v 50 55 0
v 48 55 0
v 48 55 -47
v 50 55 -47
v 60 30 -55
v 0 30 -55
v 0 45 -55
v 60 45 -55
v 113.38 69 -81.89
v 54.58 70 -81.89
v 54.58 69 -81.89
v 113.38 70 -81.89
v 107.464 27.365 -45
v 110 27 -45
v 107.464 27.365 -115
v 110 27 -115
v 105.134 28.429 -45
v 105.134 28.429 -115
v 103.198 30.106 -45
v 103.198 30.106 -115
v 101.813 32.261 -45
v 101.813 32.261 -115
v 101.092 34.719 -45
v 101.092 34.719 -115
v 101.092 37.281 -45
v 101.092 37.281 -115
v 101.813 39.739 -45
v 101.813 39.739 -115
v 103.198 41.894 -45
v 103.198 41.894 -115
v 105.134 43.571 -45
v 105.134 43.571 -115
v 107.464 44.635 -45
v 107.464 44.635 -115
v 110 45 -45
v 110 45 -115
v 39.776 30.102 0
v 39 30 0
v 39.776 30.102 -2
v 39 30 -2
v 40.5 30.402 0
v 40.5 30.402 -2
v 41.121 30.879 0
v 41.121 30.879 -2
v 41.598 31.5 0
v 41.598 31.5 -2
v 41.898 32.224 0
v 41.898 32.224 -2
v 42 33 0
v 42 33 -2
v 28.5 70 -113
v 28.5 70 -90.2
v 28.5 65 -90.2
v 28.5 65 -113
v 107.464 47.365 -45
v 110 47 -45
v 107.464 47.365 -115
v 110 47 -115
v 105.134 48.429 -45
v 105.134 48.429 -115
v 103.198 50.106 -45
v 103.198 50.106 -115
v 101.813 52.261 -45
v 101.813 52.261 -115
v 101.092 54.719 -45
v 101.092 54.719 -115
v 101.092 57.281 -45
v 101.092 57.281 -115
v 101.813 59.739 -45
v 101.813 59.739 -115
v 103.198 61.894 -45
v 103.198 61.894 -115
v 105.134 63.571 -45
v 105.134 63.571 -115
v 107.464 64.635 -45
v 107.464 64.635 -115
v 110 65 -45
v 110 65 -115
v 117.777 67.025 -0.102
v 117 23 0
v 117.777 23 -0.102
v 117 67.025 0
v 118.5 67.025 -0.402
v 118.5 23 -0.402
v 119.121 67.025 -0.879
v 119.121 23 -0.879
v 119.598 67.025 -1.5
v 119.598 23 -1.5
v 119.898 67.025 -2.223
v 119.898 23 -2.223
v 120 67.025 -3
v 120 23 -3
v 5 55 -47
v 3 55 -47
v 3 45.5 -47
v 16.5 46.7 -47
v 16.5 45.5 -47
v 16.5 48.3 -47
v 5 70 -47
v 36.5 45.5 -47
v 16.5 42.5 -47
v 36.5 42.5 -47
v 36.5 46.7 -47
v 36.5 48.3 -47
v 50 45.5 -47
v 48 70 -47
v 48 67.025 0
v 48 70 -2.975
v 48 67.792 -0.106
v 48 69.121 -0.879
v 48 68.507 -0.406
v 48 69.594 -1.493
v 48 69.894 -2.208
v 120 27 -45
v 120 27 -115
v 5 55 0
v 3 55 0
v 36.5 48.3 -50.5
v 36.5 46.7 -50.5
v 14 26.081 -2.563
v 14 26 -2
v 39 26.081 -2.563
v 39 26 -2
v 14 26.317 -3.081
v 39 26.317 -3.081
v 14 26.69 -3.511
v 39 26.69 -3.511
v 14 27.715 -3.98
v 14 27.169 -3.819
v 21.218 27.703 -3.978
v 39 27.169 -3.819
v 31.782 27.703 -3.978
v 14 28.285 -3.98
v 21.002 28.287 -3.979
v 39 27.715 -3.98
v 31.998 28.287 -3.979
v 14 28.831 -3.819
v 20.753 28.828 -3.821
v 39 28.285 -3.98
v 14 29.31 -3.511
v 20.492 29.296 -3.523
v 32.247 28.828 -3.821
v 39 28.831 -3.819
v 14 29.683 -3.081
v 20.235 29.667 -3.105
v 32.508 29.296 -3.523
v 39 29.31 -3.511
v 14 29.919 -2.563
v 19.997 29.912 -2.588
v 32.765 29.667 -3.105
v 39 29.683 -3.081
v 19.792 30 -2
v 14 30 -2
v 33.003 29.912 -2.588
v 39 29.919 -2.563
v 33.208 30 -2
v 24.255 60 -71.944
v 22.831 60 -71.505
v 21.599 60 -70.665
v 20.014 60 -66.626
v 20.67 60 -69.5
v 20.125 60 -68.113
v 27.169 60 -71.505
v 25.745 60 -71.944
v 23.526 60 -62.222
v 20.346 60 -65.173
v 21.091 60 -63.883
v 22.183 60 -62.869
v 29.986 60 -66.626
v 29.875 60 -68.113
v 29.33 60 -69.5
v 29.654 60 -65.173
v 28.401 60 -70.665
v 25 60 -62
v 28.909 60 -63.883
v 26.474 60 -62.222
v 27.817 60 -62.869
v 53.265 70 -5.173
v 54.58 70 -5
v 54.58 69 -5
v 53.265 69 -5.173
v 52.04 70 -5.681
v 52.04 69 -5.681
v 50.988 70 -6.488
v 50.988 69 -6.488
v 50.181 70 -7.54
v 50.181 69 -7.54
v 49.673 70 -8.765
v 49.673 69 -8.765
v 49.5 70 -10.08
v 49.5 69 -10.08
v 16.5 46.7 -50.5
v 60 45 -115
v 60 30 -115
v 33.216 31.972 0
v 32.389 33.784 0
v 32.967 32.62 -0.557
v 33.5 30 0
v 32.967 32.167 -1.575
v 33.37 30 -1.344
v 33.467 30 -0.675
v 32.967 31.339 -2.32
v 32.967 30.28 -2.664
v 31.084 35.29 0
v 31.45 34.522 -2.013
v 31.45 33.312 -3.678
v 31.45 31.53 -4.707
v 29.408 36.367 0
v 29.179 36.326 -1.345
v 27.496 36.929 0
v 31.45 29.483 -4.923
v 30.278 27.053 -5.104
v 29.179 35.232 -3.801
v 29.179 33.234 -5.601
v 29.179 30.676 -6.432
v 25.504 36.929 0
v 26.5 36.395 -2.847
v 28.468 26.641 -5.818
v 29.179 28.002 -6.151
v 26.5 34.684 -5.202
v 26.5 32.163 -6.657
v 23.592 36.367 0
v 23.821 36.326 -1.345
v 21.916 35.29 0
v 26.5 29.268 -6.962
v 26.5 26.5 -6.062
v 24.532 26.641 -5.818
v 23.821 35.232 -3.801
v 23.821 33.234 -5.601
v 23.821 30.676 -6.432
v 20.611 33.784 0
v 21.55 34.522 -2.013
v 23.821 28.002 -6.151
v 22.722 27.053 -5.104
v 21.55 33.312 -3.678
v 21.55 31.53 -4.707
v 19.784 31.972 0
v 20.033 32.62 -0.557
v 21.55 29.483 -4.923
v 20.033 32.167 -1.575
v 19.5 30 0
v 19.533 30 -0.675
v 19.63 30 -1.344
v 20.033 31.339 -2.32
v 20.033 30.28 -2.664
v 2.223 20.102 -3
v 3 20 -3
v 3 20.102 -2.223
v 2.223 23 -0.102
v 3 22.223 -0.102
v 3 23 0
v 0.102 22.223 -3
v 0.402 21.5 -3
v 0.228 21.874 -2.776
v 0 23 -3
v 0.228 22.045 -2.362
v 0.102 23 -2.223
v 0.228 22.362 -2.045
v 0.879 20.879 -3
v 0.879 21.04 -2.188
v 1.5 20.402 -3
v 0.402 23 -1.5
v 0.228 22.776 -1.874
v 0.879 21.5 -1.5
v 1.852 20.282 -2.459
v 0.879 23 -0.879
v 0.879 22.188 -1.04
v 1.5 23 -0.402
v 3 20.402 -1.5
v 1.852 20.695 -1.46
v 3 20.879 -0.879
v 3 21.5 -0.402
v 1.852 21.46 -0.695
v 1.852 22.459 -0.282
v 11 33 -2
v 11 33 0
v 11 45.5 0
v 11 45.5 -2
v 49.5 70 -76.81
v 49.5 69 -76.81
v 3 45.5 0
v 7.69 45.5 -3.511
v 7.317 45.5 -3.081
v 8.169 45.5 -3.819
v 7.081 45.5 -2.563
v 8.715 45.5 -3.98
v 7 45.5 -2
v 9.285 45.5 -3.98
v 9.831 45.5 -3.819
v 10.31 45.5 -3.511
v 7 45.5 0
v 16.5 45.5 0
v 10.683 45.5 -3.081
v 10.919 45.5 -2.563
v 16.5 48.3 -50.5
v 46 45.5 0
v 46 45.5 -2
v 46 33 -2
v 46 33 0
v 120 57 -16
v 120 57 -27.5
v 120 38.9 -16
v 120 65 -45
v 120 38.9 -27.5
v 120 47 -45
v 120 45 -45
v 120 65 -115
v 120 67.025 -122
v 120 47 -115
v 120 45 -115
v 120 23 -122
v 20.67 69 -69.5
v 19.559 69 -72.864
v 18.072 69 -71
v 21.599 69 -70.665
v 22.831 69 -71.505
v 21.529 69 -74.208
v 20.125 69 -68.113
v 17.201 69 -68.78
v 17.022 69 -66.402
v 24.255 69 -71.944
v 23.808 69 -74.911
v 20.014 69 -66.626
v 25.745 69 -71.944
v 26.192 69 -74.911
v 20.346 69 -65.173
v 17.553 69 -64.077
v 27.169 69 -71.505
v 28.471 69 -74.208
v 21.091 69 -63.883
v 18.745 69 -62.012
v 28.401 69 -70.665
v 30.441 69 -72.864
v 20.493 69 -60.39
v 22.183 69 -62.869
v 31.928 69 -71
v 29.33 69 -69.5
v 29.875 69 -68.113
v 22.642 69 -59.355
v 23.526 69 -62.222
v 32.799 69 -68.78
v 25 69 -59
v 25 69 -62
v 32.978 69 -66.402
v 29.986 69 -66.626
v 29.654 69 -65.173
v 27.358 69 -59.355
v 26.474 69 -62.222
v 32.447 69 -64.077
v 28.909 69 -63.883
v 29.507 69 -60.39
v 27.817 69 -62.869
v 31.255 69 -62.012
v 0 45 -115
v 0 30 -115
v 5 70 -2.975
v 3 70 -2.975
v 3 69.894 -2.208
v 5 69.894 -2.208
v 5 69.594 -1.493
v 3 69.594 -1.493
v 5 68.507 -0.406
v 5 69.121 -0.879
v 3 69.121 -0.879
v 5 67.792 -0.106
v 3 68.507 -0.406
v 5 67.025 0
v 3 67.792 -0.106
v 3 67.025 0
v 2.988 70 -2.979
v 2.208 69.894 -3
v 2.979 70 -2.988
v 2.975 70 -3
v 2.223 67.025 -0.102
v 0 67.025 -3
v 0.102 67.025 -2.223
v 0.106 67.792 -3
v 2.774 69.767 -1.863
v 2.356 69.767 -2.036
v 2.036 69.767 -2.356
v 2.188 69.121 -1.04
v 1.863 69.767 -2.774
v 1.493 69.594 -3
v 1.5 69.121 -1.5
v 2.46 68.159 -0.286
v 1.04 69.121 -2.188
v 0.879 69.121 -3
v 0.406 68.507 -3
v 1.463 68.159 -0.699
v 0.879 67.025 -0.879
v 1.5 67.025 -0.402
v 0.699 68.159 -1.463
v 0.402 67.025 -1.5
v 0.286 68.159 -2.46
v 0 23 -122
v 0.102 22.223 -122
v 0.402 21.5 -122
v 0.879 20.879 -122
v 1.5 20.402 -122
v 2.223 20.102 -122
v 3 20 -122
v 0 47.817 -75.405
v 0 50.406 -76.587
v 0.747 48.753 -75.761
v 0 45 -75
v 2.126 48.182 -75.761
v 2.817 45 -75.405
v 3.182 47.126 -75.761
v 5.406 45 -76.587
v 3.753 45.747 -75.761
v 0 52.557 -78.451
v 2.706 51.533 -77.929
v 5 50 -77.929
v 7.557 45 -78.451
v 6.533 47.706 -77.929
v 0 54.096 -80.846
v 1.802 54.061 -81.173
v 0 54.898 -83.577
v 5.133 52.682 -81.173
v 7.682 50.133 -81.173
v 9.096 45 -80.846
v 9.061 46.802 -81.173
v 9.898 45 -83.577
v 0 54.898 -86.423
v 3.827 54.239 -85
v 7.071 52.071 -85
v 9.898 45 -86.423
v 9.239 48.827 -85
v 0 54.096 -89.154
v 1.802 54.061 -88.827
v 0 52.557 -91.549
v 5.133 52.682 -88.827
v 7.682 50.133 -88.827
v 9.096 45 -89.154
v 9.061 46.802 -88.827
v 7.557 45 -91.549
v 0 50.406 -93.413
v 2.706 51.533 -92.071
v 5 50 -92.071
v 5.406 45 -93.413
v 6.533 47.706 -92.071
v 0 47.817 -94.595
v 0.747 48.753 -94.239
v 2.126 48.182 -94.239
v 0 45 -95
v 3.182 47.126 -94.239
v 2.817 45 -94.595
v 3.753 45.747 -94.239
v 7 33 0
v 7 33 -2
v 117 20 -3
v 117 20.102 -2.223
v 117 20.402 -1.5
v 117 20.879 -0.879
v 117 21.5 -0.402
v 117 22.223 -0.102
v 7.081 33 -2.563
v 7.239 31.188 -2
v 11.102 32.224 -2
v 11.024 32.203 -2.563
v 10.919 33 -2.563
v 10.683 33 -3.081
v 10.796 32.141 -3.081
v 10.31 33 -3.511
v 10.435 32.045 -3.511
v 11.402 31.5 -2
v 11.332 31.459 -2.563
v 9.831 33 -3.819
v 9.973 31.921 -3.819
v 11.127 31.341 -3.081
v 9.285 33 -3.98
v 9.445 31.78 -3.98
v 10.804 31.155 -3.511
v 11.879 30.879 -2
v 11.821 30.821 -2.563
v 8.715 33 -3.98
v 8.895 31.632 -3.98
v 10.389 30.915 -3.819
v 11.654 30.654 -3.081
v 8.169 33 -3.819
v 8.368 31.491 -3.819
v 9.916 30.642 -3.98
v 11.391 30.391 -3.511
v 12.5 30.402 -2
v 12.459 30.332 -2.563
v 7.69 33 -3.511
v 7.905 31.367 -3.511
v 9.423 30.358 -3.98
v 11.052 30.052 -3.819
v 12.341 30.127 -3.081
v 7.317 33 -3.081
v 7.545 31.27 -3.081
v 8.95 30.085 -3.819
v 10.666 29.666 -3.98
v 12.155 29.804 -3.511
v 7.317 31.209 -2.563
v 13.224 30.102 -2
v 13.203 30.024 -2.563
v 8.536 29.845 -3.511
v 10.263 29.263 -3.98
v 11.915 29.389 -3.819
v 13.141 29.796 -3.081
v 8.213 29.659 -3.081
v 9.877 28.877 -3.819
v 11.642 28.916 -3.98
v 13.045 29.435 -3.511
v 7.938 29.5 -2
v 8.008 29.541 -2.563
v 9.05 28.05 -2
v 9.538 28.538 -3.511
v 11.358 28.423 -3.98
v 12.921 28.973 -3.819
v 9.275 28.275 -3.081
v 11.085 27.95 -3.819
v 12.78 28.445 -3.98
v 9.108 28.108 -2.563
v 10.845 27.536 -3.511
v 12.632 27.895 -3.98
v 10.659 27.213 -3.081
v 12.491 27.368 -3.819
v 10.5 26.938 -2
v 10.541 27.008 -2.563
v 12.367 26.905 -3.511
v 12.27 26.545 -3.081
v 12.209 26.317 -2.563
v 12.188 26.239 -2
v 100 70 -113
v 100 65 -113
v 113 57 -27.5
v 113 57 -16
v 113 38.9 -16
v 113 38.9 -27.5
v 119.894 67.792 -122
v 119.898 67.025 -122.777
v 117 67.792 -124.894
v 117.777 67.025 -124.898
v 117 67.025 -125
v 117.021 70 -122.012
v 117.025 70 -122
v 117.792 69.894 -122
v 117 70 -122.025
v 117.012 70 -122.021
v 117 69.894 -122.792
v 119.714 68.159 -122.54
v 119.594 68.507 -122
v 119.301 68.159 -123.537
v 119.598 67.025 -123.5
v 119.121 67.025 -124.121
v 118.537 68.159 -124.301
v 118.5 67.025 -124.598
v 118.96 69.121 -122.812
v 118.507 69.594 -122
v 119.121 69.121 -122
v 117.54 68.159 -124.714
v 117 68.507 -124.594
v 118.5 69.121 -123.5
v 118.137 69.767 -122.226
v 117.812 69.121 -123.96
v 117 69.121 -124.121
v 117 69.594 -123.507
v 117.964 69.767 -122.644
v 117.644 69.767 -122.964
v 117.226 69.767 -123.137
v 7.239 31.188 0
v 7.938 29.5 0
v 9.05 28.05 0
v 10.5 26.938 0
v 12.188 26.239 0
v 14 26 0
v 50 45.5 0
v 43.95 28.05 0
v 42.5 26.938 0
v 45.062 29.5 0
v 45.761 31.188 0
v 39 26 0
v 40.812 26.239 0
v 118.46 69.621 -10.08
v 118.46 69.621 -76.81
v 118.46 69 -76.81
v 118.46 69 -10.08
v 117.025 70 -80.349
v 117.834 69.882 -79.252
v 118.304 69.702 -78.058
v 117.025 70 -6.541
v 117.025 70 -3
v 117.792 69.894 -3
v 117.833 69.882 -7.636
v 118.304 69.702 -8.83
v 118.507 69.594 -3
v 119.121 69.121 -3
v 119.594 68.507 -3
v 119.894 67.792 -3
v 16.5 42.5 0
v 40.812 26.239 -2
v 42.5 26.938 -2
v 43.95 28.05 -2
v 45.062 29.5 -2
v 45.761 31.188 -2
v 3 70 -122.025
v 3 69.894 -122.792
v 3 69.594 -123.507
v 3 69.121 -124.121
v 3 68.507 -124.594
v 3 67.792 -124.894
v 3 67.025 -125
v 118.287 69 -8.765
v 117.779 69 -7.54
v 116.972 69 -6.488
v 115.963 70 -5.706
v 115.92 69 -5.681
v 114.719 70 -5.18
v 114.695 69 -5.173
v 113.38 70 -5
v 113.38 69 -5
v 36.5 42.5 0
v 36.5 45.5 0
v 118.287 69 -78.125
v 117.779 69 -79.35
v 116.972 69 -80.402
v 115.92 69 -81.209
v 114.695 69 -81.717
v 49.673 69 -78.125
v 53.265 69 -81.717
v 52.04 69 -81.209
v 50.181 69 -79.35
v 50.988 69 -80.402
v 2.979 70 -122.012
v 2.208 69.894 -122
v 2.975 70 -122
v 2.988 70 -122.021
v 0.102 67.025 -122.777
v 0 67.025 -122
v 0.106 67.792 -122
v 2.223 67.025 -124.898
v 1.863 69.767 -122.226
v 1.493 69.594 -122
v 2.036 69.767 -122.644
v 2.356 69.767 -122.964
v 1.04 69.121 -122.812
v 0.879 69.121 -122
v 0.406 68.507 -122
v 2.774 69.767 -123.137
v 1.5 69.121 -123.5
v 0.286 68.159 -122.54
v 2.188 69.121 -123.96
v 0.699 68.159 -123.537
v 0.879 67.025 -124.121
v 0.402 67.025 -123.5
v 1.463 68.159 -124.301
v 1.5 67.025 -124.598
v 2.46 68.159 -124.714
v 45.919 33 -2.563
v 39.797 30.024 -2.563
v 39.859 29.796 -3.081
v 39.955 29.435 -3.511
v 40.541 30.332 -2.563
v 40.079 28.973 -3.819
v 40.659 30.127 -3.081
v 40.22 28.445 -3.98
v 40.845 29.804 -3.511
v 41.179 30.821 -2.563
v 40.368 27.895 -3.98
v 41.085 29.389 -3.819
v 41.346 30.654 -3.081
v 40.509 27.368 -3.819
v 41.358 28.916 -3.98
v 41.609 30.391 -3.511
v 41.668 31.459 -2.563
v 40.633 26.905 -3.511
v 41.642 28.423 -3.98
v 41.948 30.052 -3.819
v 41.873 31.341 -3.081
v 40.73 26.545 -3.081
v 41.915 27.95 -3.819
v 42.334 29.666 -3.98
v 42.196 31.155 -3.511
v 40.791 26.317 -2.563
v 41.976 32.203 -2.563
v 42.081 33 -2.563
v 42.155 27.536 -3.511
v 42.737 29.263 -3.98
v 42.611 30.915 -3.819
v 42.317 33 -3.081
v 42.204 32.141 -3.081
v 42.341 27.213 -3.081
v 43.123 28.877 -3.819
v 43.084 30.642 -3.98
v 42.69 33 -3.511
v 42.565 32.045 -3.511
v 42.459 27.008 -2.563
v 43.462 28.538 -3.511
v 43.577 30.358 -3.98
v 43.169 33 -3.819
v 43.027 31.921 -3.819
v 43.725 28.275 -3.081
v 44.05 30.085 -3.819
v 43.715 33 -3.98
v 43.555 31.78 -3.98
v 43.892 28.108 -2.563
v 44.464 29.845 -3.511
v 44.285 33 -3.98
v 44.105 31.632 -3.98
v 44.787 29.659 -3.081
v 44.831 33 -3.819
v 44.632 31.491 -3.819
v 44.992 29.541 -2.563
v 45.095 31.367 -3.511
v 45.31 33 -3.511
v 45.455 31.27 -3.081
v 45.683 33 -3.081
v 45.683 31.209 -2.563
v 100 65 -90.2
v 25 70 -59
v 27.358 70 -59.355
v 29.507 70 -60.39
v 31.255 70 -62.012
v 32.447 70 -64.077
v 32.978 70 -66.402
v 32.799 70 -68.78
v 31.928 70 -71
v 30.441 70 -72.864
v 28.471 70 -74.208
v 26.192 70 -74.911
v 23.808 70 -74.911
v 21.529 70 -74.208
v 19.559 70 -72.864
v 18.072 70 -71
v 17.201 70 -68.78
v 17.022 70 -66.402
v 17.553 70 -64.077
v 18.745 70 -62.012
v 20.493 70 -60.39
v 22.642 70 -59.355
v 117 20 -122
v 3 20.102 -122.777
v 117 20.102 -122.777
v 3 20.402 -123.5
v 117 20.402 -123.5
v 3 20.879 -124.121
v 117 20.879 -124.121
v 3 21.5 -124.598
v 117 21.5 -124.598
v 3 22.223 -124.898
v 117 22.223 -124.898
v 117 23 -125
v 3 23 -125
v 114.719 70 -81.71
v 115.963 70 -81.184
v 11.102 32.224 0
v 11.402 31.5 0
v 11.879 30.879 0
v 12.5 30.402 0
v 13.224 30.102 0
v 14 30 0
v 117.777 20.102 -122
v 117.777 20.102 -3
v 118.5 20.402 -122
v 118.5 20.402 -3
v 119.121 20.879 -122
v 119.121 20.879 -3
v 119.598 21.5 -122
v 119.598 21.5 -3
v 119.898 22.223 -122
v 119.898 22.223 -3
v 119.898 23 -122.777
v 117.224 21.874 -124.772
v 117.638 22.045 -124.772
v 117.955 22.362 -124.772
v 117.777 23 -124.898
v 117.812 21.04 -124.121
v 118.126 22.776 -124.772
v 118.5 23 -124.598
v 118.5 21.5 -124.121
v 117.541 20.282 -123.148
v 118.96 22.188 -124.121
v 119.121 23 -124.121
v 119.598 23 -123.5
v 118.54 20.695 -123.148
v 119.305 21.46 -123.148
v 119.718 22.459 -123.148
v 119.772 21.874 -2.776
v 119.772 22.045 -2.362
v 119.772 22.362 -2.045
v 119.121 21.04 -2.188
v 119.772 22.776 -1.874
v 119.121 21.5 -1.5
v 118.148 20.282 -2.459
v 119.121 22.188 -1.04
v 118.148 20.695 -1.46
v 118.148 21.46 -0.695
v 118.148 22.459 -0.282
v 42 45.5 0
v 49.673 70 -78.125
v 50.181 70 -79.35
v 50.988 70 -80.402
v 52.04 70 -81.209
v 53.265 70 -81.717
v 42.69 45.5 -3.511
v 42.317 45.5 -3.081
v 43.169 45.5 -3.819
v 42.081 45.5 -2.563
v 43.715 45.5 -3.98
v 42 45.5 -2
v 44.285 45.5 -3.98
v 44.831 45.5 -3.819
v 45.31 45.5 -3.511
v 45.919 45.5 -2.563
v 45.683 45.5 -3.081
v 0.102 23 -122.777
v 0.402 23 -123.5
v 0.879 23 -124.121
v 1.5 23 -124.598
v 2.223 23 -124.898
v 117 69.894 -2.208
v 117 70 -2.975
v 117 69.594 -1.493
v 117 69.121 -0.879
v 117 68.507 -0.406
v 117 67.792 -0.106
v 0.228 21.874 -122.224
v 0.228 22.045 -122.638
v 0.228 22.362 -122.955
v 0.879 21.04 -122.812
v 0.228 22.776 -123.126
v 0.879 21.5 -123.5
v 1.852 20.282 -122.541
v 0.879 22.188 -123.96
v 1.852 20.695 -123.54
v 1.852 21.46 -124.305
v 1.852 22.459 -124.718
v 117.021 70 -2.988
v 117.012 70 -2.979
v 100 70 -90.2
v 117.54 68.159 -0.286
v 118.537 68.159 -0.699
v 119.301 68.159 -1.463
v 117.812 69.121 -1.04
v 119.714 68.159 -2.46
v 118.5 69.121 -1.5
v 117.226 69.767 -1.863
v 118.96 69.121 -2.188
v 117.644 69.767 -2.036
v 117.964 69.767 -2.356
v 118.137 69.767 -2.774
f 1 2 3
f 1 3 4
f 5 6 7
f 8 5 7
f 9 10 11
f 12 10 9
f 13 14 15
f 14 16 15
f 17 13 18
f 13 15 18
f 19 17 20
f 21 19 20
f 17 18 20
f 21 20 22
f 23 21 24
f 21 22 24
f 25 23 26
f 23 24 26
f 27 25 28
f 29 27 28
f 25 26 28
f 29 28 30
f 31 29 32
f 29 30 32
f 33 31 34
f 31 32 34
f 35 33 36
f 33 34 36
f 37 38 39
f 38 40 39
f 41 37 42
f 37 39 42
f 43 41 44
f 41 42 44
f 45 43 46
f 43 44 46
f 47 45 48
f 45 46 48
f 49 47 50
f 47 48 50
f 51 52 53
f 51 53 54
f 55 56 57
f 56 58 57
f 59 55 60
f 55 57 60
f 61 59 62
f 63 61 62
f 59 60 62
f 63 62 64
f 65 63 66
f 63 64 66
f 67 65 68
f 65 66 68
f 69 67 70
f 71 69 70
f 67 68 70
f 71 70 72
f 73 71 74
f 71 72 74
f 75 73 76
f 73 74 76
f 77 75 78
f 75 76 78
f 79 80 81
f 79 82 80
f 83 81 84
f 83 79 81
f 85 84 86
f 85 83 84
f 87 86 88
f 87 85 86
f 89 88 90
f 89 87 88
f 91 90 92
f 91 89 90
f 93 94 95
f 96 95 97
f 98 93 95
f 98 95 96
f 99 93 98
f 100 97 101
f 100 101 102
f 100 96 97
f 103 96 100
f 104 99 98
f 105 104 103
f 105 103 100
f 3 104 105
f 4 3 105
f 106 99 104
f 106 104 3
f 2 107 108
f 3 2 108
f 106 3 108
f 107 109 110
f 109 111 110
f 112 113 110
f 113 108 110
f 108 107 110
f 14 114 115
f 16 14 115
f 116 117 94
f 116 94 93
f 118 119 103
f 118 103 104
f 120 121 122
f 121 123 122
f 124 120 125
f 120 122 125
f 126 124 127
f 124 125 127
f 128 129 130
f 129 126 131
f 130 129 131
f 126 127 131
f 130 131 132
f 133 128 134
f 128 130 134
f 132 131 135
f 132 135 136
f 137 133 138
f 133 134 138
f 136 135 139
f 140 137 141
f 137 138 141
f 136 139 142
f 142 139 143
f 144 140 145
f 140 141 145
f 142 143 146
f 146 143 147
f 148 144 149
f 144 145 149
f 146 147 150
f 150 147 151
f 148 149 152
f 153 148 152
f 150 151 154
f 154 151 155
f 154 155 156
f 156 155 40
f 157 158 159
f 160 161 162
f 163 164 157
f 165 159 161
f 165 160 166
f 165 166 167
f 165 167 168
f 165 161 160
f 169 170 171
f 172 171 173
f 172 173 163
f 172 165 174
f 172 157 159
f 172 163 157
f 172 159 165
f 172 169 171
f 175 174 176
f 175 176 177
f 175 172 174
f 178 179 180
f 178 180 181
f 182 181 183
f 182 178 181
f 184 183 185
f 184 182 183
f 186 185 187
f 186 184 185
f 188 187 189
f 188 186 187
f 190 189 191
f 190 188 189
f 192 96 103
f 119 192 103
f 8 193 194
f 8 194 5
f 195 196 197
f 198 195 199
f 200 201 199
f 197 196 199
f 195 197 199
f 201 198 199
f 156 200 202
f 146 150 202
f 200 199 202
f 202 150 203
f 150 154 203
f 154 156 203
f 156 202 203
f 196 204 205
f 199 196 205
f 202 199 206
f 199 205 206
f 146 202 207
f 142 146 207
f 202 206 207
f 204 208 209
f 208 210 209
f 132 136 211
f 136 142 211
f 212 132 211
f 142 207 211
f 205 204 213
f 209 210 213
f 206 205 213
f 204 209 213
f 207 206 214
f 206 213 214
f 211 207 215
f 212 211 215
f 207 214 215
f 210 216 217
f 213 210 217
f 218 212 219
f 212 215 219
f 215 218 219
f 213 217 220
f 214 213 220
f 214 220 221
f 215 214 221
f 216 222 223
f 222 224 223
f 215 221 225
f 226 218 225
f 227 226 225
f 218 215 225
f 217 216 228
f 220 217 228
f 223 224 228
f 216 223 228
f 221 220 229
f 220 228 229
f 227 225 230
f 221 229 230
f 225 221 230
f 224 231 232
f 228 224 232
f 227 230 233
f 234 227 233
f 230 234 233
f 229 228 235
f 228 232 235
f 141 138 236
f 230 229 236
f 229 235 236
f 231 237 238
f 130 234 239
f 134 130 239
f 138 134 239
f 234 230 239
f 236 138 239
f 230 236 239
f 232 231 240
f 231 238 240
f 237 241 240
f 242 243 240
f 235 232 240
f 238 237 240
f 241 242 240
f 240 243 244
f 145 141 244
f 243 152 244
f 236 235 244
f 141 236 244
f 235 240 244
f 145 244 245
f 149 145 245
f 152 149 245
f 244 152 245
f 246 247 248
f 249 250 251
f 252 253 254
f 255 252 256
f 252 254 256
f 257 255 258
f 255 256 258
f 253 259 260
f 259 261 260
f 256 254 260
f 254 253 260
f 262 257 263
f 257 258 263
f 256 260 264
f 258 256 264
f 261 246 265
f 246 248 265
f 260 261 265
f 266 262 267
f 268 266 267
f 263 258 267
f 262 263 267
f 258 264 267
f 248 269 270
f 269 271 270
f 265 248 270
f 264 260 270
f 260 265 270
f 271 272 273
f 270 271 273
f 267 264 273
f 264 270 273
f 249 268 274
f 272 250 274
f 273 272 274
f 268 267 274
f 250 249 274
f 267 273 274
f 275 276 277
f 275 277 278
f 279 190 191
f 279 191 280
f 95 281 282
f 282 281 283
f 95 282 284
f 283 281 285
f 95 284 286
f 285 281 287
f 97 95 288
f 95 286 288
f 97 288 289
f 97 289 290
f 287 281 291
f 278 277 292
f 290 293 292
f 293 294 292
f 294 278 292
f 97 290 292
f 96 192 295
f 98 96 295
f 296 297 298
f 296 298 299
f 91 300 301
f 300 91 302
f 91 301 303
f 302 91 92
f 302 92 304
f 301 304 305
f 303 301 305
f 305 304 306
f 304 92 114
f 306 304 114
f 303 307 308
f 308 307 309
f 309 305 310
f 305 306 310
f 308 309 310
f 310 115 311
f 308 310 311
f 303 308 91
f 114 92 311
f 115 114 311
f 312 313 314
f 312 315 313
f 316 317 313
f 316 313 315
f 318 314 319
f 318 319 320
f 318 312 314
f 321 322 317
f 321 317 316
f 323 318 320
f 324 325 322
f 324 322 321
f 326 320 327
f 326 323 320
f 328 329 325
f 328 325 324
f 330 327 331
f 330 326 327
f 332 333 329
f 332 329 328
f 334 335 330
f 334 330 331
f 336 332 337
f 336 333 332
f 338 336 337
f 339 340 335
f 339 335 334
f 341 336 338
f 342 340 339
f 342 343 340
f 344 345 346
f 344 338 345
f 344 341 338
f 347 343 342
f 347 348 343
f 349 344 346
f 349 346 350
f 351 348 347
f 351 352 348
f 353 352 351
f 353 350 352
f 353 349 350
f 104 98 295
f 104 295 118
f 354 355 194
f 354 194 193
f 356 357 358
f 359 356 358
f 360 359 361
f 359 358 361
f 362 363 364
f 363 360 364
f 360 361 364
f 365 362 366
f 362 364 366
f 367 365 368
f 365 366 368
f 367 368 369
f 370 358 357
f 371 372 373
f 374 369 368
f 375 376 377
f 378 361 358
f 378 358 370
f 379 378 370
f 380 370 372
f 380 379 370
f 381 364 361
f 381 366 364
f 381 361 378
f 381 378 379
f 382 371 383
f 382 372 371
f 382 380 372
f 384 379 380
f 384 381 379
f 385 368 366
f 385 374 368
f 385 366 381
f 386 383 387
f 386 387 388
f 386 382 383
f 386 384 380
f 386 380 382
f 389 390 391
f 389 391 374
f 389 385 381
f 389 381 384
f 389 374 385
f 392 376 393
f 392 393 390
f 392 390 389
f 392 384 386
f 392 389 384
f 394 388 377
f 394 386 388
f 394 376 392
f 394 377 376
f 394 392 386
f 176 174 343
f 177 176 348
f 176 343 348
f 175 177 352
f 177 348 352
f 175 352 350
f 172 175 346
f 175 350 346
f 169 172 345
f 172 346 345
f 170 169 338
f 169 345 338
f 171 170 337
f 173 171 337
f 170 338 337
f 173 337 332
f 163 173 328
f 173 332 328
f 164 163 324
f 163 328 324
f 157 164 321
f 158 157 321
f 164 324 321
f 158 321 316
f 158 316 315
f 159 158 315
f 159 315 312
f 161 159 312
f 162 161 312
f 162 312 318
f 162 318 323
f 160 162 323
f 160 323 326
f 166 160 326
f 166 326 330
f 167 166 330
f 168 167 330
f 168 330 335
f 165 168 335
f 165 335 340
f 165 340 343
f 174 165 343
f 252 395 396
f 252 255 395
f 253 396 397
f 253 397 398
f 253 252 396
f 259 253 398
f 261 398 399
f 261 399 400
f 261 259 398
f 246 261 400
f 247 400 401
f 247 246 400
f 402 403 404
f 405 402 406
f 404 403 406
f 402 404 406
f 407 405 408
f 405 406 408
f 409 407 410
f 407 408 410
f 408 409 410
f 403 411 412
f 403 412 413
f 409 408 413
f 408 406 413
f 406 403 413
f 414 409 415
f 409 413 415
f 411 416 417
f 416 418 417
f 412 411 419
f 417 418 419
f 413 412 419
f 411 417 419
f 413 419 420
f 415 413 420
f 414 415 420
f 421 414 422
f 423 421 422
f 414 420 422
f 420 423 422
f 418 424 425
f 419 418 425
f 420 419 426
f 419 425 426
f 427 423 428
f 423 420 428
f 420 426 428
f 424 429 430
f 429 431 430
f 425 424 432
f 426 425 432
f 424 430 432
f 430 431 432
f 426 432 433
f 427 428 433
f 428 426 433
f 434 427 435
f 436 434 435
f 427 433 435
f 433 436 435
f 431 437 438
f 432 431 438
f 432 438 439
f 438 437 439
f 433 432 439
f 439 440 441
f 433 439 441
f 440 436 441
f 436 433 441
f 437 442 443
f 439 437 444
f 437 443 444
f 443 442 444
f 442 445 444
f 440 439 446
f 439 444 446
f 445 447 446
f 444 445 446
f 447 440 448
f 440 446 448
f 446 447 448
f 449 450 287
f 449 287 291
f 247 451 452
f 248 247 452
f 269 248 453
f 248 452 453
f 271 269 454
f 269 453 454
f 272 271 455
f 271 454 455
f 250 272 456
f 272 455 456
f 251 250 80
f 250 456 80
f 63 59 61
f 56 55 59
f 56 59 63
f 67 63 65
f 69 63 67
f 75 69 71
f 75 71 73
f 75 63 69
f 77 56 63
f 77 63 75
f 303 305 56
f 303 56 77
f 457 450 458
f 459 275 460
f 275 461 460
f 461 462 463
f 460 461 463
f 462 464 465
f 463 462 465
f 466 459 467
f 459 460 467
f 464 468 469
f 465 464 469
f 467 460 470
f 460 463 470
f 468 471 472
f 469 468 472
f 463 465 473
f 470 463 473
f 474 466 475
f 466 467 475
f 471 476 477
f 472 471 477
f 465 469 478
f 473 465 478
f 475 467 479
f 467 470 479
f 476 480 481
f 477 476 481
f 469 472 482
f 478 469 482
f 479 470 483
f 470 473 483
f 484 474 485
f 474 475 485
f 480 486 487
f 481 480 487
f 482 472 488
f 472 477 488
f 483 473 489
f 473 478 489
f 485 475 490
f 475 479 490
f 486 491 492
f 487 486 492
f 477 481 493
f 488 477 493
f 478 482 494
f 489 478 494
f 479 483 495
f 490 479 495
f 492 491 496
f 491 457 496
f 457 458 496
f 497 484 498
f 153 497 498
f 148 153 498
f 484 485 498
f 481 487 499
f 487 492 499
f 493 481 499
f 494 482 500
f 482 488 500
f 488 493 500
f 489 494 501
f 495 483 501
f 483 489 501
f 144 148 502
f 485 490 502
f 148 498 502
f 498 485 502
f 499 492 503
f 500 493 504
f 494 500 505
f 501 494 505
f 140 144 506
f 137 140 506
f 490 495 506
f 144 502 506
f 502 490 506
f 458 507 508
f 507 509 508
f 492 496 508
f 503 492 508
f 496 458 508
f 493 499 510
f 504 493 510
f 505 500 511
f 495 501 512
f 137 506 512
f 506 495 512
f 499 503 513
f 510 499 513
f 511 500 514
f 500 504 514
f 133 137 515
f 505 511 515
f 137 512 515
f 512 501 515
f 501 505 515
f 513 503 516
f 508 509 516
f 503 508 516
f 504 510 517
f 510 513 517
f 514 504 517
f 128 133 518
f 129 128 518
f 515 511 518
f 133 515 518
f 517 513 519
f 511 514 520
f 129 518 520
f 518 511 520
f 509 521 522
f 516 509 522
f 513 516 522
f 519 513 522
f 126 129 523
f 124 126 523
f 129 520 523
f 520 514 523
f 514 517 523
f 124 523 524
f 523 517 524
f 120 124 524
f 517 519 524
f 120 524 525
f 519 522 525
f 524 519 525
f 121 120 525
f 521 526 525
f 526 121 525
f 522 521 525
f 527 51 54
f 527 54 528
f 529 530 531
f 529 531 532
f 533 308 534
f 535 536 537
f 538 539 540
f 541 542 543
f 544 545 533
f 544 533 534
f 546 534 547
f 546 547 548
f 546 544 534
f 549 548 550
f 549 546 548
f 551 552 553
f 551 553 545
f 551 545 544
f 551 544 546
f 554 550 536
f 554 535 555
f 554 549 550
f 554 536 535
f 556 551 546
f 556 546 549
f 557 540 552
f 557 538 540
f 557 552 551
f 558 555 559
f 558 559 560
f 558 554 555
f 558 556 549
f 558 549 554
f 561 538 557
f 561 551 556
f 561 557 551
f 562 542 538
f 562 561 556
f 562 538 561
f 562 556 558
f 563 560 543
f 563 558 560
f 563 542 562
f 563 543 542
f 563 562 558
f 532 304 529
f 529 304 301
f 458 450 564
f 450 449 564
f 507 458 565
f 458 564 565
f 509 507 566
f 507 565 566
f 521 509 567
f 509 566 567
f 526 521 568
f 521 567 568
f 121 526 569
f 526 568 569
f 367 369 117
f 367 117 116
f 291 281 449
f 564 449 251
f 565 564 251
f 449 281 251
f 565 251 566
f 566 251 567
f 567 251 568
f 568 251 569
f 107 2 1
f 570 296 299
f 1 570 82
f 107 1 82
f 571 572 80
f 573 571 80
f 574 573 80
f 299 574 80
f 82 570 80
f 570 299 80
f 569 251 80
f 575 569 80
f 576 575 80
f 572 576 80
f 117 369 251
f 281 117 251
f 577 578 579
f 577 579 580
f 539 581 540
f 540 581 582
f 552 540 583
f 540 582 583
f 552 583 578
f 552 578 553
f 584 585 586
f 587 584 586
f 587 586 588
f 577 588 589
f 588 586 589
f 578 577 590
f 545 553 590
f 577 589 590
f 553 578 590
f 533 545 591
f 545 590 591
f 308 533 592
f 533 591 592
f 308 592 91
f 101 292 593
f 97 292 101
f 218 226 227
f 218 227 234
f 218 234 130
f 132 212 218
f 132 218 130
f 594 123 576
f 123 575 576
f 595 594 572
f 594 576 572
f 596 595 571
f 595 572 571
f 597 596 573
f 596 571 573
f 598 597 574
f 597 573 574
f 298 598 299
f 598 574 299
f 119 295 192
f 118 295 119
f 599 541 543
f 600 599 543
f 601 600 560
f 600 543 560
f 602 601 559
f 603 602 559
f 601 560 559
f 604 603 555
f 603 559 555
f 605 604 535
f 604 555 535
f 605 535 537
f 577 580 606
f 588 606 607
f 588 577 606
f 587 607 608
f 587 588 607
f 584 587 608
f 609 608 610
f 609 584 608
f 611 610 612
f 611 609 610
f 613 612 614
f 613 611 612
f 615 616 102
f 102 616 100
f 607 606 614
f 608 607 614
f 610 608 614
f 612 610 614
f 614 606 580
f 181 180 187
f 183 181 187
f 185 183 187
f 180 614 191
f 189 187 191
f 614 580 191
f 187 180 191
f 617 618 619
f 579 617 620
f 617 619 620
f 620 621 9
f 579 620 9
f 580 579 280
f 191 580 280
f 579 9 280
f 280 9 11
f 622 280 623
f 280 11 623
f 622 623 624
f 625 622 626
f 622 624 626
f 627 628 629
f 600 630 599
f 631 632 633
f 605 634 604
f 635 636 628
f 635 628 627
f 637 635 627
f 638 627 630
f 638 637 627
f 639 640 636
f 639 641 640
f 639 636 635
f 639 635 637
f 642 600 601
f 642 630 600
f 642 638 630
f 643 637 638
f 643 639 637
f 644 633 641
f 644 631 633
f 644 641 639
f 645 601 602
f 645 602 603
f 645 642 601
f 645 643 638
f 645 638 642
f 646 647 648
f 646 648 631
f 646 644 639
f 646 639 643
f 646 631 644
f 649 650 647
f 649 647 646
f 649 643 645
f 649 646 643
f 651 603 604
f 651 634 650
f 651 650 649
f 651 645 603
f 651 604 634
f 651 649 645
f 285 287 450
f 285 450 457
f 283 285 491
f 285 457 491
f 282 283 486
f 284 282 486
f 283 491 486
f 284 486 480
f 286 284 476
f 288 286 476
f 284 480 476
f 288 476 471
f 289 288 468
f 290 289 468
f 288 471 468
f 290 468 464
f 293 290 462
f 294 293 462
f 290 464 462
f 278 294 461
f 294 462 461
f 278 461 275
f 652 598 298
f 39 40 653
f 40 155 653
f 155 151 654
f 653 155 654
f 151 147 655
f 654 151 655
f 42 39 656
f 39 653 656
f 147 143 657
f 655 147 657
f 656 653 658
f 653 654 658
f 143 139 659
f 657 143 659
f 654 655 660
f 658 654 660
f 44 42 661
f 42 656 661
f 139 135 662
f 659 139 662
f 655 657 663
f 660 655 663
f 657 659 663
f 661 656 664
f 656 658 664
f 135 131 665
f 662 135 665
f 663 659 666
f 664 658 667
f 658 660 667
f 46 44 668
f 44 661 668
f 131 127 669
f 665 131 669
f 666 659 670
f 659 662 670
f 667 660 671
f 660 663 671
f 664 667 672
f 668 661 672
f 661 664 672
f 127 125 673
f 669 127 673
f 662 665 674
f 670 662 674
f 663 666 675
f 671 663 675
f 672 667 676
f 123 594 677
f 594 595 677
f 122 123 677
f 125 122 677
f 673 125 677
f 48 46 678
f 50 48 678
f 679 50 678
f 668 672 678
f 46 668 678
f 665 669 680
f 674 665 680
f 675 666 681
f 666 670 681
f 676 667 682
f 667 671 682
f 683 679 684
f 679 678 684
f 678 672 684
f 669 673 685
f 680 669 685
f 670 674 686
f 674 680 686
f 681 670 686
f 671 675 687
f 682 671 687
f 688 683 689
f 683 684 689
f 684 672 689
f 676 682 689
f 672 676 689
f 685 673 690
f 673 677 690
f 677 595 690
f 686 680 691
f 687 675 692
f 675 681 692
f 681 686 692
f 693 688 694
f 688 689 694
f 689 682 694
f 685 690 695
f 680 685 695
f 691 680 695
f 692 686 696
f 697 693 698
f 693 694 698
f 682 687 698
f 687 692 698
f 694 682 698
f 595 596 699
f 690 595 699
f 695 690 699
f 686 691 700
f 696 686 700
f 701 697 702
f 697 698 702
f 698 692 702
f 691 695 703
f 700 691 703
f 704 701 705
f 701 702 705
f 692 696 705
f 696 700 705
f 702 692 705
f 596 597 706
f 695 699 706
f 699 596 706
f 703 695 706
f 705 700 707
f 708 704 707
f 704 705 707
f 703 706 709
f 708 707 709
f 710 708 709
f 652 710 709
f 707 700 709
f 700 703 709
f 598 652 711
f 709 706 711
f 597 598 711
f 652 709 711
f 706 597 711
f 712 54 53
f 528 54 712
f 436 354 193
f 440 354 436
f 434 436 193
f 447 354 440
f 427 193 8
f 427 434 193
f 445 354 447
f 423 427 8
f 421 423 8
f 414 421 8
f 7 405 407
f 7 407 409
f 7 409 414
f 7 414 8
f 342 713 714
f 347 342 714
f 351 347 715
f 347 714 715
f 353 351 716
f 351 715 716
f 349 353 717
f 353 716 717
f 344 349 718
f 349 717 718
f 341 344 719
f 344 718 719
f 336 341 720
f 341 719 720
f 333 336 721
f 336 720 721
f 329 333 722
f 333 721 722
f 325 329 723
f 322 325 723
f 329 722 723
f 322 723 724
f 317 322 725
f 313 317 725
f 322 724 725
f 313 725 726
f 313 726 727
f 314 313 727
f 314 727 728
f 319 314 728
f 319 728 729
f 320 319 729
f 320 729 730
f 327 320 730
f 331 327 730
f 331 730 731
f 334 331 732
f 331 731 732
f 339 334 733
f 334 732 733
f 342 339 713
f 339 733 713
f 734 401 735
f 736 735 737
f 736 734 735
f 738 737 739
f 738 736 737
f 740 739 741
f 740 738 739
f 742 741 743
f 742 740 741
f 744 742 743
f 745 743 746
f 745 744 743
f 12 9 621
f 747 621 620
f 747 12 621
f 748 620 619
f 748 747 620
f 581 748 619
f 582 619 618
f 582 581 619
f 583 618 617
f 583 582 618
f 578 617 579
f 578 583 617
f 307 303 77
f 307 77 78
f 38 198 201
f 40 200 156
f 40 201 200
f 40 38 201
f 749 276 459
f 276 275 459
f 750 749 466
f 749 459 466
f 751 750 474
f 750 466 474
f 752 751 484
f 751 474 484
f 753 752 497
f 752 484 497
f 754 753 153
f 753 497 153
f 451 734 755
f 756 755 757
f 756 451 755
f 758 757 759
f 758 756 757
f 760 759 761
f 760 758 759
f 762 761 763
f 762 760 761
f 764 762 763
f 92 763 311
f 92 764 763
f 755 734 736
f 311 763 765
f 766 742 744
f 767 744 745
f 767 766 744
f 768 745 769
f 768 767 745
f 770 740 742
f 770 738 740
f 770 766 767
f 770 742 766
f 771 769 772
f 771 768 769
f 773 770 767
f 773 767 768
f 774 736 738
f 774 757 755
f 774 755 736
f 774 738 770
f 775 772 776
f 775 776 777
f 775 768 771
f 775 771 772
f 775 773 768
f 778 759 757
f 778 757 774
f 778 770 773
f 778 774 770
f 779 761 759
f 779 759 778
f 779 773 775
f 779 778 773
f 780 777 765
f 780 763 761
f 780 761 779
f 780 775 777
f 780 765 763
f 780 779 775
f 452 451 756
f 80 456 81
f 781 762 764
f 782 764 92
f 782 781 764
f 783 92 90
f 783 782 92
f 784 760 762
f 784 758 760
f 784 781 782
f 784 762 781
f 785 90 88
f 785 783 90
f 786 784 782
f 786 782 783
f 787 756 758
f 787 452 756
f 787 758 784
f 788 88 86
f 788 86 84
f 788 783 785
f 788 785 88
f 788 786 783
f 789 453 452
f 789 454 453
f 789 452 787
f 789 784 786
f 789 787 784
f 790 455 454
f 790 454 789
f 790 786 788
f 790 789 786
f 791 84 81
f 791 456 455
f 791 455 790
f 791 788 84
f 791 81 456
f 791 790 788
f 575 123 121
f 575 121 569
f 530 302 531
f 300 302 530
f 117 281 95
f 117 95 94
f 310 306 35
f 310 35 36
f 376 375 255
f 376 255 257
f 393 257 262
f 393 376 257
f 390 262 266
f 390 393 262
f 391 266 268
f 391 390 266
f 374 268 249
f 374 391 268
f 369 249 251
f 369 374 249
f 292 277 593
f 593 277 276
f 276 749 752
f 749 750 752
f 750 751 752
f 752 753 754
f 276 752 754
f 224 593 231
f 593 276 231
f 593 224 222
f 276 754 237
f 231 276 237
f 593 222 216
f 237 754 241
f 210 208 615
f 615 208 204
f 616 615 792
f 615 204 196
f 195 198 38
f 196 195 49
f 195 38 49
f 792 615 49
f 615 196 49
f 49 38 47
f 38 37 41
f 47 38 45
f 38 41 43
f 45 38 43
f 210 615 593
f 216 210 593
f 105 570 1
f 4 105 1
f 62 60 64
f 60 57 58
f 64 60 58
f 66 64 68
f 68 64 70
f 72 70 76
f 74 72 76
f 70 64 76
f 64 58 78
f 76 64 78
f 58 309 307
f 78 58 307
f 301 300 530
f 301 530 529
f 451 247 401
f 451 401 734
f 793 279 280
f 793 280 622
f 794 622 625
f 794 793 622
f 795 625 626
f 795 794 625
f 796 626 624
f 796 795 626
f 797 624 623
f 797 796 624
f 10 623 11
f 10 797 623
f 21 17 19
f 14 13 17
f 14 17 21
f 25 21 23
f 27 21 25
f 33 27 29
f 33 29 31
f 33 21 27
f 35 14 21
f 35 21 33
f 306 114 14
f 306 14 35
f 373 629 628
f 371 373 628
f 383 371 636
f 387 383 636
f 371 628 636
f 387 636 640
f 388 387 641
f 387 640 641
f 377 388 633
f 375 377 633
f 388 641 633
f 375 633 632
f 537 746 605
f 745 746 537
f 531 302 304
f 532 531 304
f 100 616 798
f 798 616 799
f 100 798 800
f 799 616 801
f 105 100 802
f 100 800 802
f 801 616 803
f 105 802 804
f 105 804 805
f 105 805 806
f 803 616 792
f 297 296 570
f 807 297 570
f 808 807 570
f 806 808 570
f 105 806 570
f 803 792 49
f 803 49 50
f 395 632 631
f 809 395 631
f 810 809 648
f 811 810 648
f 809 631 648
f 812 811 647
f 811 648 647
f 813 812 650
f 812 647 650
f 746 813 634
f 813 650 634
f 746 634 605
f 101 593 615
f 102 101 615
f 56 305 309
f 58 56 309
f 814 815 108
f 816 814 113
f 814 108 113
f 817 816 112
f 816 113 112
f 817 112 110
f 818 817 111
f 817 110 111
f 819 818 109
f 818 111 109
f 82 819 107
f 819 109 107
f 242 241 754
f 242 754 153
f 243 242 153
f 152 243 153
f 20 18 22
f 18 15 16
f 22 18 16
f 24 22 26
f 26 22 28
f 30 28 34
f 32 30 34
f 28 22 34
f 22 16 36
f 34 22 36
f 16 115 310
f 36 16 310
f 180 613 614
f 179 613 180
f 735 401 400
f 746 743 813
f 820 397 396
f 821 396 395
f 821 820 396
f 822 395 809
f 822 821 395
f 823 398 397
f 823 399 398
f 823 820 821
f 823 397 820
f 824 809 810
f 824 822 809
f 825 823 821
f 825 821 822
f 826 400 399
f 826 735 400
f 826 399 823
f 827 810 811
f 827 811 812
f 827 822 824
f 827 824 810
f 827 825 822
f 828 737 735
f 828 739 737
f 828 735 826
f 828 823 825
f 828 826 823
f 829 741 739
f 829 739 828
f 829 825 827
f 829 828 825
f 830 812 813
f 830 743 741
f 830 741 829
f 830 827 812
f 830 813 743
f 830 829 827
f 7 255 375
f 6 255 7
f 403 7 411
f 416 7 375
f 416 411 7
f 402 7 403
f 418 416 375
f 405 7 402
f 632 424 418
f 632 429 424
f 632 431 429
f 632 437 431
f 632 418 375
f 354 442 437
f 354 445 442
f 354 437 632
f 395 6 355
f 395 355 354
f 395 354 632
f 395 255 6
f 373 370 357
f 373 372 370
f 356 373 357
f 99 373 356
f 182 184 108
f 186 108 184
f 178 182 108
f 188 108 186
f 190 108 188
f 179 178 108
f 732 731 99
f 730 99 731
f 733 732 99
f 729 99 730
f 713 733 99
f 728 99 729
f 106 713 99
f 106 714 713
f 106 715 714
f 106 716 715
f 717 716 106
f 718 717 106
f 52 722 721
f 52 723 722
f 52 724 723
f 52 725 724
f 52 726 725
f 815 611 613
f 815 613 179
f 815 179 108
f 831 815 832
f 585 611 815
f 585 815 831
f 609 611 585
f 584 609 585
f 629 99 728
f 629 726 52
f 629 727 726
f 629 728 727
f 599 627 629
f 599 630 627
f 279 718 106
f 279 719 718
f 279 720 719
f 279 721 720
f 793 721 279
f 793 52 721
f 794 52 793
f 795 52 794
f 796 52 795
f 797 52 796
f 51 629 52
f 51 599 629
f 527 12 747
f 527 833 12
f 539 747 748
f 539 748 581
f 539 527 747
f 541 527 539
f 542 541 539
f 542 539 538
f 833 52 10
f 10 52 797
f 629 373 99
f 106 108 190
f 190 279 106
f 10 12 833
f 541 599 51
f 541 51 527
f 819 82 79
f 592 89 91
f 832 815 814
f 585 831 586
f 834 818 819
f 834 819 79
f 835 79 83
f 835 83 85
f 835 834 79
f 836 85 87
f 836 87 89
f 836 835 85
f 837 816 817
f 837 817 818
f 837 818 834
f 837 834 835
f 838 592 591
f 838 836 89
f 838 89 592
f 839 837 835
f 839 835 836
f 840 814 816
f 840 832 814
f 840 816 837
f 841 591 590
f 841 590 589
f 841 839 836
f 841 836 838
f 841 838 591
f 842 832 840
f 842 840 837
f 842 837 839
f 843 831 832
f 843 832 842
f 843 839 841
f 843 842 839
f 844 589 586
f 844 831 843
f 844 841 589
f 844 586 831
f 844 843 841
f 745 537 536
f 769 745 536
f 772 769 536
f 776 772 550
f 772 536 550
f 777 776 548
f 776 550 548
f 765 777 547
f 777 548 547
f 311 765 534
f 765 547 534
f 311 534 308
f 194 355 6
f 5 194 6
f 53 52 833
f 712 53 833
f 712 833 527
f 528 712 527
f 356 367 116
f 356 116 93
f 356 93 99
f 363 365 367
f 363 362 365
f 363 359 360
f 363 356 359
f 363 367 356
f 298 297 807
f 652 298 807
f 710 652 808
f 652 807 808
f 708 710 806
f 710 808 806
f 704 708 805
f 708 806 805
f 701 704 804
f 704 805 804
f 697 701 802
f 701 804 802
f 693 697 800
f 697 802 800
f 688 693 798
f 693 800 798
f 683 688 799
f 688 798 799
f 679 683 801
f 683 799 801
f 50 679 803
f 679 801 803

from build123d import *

# Parameters (mm, degrees)
SKETCH1_W           = 120
SKETCH1_H           = 125
BOSS_EXTRUDE1_DEPTH = 70
SKETCH3_W           = 47
SKETCH3_H           = 9.5
CUT_EXTRUDE1_DEPTH  = 47
SKETCH4_W           = 43
SKETCH4_H           = 15
CUT_EXTRUDE2_DEPTH  = 47
CUT_REVOLVE1_ANGLE  = 120
SKETCH9_W           = 20
SKETCH9_H           = 47
CUT_EXTRUDE3_DEPTH  = 3
SKETCH10_W          = 20
SKETCH10_H          = 1.6
CUT_EXTRUDE4_DEPTH  = 3.5
CUT_EXTRUDE5_DEPTH  = 1
SKETCH13_W          = 71.5
SKETCH13_H          = 22.8
CUT_EXTRUDE6_DEPTH  = 5
SKETCH14_R          = 5
CUT_EXTRUDE7_DEPTH  = 10
SKETCH15_R          = 8
CUT_EXTRUDE8_DEPTH  = 1
SKETCH16_W          = 70
SKETCH16_H          = 18
CUT_EXTRUDE9_DEPTH  = 10
SKETCH17_W          = 70
SKETCH17_H          = 9
SKETCH18_W          = 70
SKETCH18_H          = 9
SKETCH19_W          = 60
SKETCH19_H          = 15
CUT_EXTRUDE10_DEPTH = 60
CUT_REVOLVE4_ANGLE  = 90
SKETCH21_W          = 120
SKETCH21_H          = 125
CUT_EXTRUDE11_DEPTH = 20
FILLET1_R           = 3
FILLET2_R           = 3
SKETCH22_W          = 11.5
SKETCH22_H          = 18.1
CUT_EXTRUDE12_DEPTH = 7


# Some blends are built 0.0001 mm under size
with BuildPart() as part:
    # Sketch1 → Boss-Extrude1 (new body)
    with BuildSketch(Plane(origin=(0, 0, 0), x_dir=(1, 0, 0), z_dir=(0, 1, 0))):
        with Locations((60, 62.5)):
            Rectangle(SKETCH1_W, SKETCH1_H)
    extrude(amount=BOSS_EXTRUDE1_DEPTH)

    # Sketch3 → Cut-Extrude1 (cut)
    with BuildSketch(Plane.XY):
        with Locations((26.5, 50.25)):
            Rectangle(SKETCH3_W, SKETCH3_H)
    extrude(amount=-CUT_EXTRUDE1_DEPTH, mode=Mode.SUBTRACT)

    # Sketch4 → Cut-Extrude2 (cut)
    with BuildSketch(Plane.XY):
        with Locations((26.5, 62.5)):
            Rectangle(SKETCH4_W, SKETCH4_H)
    extrude(amount=-CUT_EXTRUDE2_DEPTH, mode=Mode.SUBTRACT)

    # Cut-Sweep1: sweep along a path in Sketch5
    with BuildLine(Plane.XY) as cut_sweep1_path:
        Line((9, 45.5), (9, 33))
        ThreePointArc((9, 33), (10.464466094, 29.464466094), (14, 28))
        Line((14, 28), (39, 28))
        ThreePointArc((39, 28), (42.535533906, 29.464466094), (44, 33))
        Line((44, 33), (44, 45.5))
    # Sketch6 → Cut-Sweep1 (sweep, cut)
    with BuildSketch(Plane(origin=(0, 45.5, 0), x_dir=(1, 0, 0), z_dir=(0, 1, 0))):
        with BuildLine():
            Line((7, 0), (7, 2))
            ThreePointArc((7, 2), (9, 4), (11, 2))
            Line((11, 2), (11, 0))
            Line((11, 0), (7, 0))
        make_face()
    sweep(path=cut_sweep1_path.line, mode=Mode.SUBTRACT)

    # Sketch7 → Cut-Revolve1 (revolve, cut)
    with BuildSketch(Plane.XY):
        with BuildLine():
            Line((19.5, 30), (33.5, 30))
            ThreePointArc((33.5, 30), (26.5, 37), (19.5, 30))
        make_face()
    revolve(axis=Axis((19.5, 30, 0), (-1, 0, 0)), revolution_arc=CUT_REVOLVE1_ANGLE, mode=Mode.SUBTRACT)

    # Sketch9 → Cut-Extrude3 (cut)
    with BuildSketch(Plane(origin=(0, 45.5, 0), x_dir=(1, 0, 0), z_dir=(0, 1, 0))):
        with Locations((26.5, 23.5)):
            Rectangle(SKETCH9_W, SKETCH9_H)
    extrude(amount=-CUT_EXTRUDE3_DEPTH, mode=Mode.SUBTRACT)

    # Sketch10 → Cut-Extrude4 (cut)
    with BuildSketch(Plane.XY.offset(-47)):
        with Locations((26.5, 47.5)):
            Rectangle(SKETCH10_W, SKETCH10_H)
    extrude(amount=-CUT_EXTRUDE4_DEPTH, mode=Mode.SUBTRACT)

    # Sketch11 → Cut-Extrude5 (cut)
    with BuildSketch(Plane(origin=(0, 70, 0), x_dir=(1, 0, 0), z_dir=(0, 1, 0))):
        with BuildLine():
            Line((54.58, 81.89), (113.38, 81.89))
            ThreePointArc((113.38, 81.89), (116.972102448, 80.402102448), (118.46, 76.81))
            Line((118.46, 76.81), (118.46, 10.08))
            ThreePointArc((118.46, 10.08), (116.972102448, 6.487897552), (113.38, 5))
            Line((113.38, 5), (54.58, 5))
            ThreePointArc((54.58, 5), (50.987897552, 6.487897552), (49.5, 10.08))
            Line((49.5, 10.08), (49.5, 76.81))
            ThreePointArc((49.5, 76.81), (50.987897552, 80.402102448), (54.58, 81.89))
        make_face()
    extrude(amount=-CUT_EXTRUDE5_DEPTH, mode=Mode.SUBTRACT)

    # Sketch13 → Cut-Extrude6 (cut)
    with BuildSketch(Plane(origin=(0, 70, 0), x_dir=(1, 0, 0), z_dir=(0, 1, 0))):
        with Locations((64.25, 101.6)):
            Rectangle(SKETCH13_W, SKETCH13_H)
    extrude(amount=-CUT_EXTRUDE6_DEPTH, mode=Mode.SUBTRACT)

    # Sketch14 → Cut-Extrude7 (cut)
    with BuildSketch(Plane(origin=(0, 70, 0), x_dir=(1, 0, 0), z_dir=(0, 1, 0))):
        with Locations(Location((25, 67, 0), (0, 0, 270))):
            Circle(SKETCH14_R)
    extrude(amount=-CUT_EXTRUDE7_DEPTH, mode=Mode.SUBTRACT)

    # Sketch15 → Cut-Extrude8 (cut)
    with BuildSketch(Plane(origin=(0, 70, 0), x_dir=(1, 0, 0), z_dir=(0, 1, 0))):
        with Locations(Location((25, 67, 0), (0, 0, 270))):
            Circle(SKETCH15_R)
    extrude(amount=-CUT_EXTRUDE8_DEPTH, mode=Mode.SUBTRACT)

    # Sketch16 → Cut-Extrude9 (cut)
    with BuildSketch(Plane(origin=(120, 0, 0), x_dir=(0, 0, -1), z_dir=(1, 0, 0))):
        with Locations((80, 56)):
            Rectangle(SKETCH16_W, SKETCH16_H)
        with Locations((80, 36)):
            Rectangle(SKETCH16_W, SKETCH16_H)
    extrude(amount=-CUT_EXTRUDE9_DEPTH, mode=Mode.SUBTRACT)

    # Sketch17 → Cut-Revolve2 (revolve, cut)
    with BuildSketch(Plane(origin=(110, 0, 0), x_dir=(0, 0, -1), z_dir=(1, 0, 0))):
        with Locations((80, 60.5)):
            Rectangle(SKETCH17_W, SKETCH17_H)
    revolve(axis=Axis((110, 56, -45), (0, 0, -1)), mode=Mode.SUBTRACT)

    # Sketch18 → Cut-Revolve3 (revolve, cut)
    with BuildSketch(Plane(origin=(110, 0, 0), x_dir=(0, 0, -1), z_dir=(1, 0, 0))):
        with Locations((80, 40.5)):
            Rectangle(SKETCH18_W, SKETCH18_H)
    revolve(axis=Axis((110, 36, -45), (0, 0, -1)), mode=Mode.SUBTRACT)

    # Sketch19 → Cut-Extrude10 (cut)
    with BuildSketch(Plane.ZY):
        with Locations((-85, 37.5)):
            Rectangle(SKETCH19_W, SKETCH19_H)
    extrude(amount=-CUT_EXTRUDE10_DEPTH, mode=Mode.SUBTRACT)

    # Sketch20 → Cut-Revolve4 (revolve, cut)
    with BuildSketch(Plane.ZY):
        with BuildLine():
            Line((-95, 45), (-75, 45))
            ThreePointArc((-75, 45), (-85, 55), (-95, 45))
        make_face()
    revolve(axis=Axis((0, 45, -95), (0, 0, -1)), revolution_arc=CUT_REVOLVE4_ANGLE, mode=Mode.SUBTRACT)

    # Sketch21 → Cut-Extrude11 (cut)
    with BuildSketch(Plane.XZ):
        with Locations((60, -62.5)):
            Rectangle(SKETCH21_W, SKETCH21_H)
    extrude(amount=-CUT_EXTRUDE11_DEPTH, mode=Mode.SUBTRACT)

    # Fillet1
    fillet1_edges = [part.edges().sort_by_distance(p)[0] for p in [
        (60, 20, 0),
        (120, 20, -62.5),
        (60, 20, -125),
        (0, 20, -62.5),
        (0, 45, -125),
        (120, 45, -125),
        (120, 45, 0),
        (0, 45, 0),
    ]]
    fillet(fillet1_edges, radius=FILLET1_R - 0.0001)  # a hair under: the kernel refuses the full size

    # Fillet2
    # the kernel refuses this fillet: 3 mm, written as the material it takes off along each edge
    with BuildSketch(Plane(origin=(40.500249996, 70, 0), x_dir=(0, -0.9999999994444074, 3.3334444463032727e-05), z_dir=(1, 0, 0))) as fillet2_piece_1:
        with BuildLine():
            CenterArc((2.999799998, 2.999999998), FILLET2_R, 180.001909923, 90)
            Line((-0.0002, 2.999899995), (-0.0602, 2.999897995))
            ThreePointArc((-0.0602, 2.999897995), (-0.06005, 1.499947999), (-0.06, -2e-06))
            Line((-0.06, -2e-06), (2e-06, -0.06))
            ThreePointArc((2e-06, -0.06), (1.499951999, -0.05995), (2.999902002, -0.06))
            Line((2.999902002, -0.06), (2.999900002, 0))
        make_face()
    extrude(amount=76.499850004, mode=Mode.SUBTRACT)
    with BuildSketch(Plane(origin=(117.0001, 70, -2.9999), x_dir=(0, 0, 1), z_dir=(-1, 0, 0))) as fillet2_piece_2:
        with BuildLine():
            CenterArc((0, -2.9999), FILLET2_R, 0, 90)
            Line((3, -2.9999), (3.06, -2.9999))
            ThreePointArc((3.06, -2.9999), (3.0599, -1.49995), (3.0599, 0))
            Line((3.0599, 0), (2.9999, 0.06))
            ThreePointArc((2.9999, 0.06), (1.49995, 0.06), (0, 0.0601))
            Line((0, 0.0601), (0, 0.0001))
        make_face()
    revolve(axis=Axis((117.0001, 70, -2.9999), (0, 1, 0)), revolution_arc=90, mode=Mode.SUBTRACT)
    with BuildSketch(Plane(origin=(120, 70, -2.9999), x_dir=(-0.9999999994444074, 3.333444446406897e-05, 0), z_dir=(0, 0, -1)), Plane(origin=(0, 70, -122.0001), x_dir=(0.9999999994444074, 3.333444446406897e-05, 0), z_dir=(0, 0, 1))) as fillet2_piece_3:
        with BuildLine():
            CenterArc((2.999799998, -2.999999998), FILLET2_R, 89.998090077, 90)
            Line((-0.0002, -2.999899995), (-0.0602, -2.999897995))
            ThreePointArc((-0.0602, -2.999897995), (-0.06005, -1.499947999), (-0.06, 2e-06))
            Line((-0.06, 2e-06), (2e-06, 0.06))
            ThreePointArc((2e-06, 0.06), (1.499951999, 0.05995), (2.999902002, 0.06))
            Line((2.999902002, 0.06), (2.999900002, 0))
        make_face()
    extrude(amount=119.0002, mode=Mode.SUBTRACT)
    with BuildSketch(Plane(origin=(117.0001, 70, -122.0001), x_dir=(1, 0, 0), z_dir=(0, 0, 1))) as fillet2_piece_4:
        with BuildLine():
            CenterArc((0, -2.9999), FILLET2_R, 0, 90)
            Line((3, -2.9999), (3.06, -2.9999))
            ThreePointArc((3.06, -2.9999), (3.0599, -1.49995), (3.0599, 0))
            Line((3.0599, 0), (2.9999, 0.06))
            ThreePointArc((2.9999, 0.06), (1.49995, 0.06), (0, 0.0601))
            Line((0, 0.0601), (0, 0.0001))
        make_face()
    revolve(axis=Axis((117.0001, 70, -122.0001), (0, 1, 0)), revolution_arc=90, mode=Mode.SUBTRACT)
    with BuildSketch(Plane(origin=(117.0001, 70, -125), x_dir=(0, 3.333444446406897e-05, 0.9999999994444074), z_dir=(-1, 0, 0))) as fillet2_piece_5:
        with BuildLine():
            CenterArc((2.999799998, -2.999999998), FILLET2_R, 89.998090077, 90)
            Line((-0.0002, -2.999899995), (-0.0602, -2.999897995))
            ThreePointArc((-0.0602, -2.999897995), (-0.06005, -1.499947999), (-0.06, 2e-06))
            Line((-0.06, 2e-06), (2e-06, 0.06))
            ThreePointArc((2e-06, 0.06), (1.499951999, 0.05995), (2.999902002, 0.06))
            Line((2.999902002, 0.06), (2.999900002, 0))
        make_face()
    extrude(amount=114.0002, mode=Mode.SUBTRACT)
    with BuildSketch(Plane(origin=(2.9999, 70, -122.0001), x_dir=(-1, 0, 0), z_dir=(0, 0, 1))) as fillet2_piece_6:
        with BuildLine():
            CenterArc((0, 2.9999), FILLET2_R, 270, 90)
            Line((3, 2.9999), (3.06, 2.9999))
            ThreePointArc((3.06, 2.9999), (3.0599, 1.49995), (3.0599, 0))
            Line((3.0599, 0), (2.9999, -0.06))
            ThreePointArc((2.9999, -0.06), (1.49995, -0.06), (0, -0.0601))
            Line((0, -0.0601), (0, -0.0001))
        make_face()
    revolve(axis=Axis((2.9999, 70, -122.0001), (0, -1, 0)), revolution_arc=90, mode=Mode.SUBTRACT)
    with BuildSketch(Plane(origin=(2.9999, 70, 0), x_dir=(0, -0.9999999994444074, 3.3334444463032727e-05), z_dir=(1, 0, 0))) as fillet2_piece_7:
        with BuildLine():
            CenterArc((2.999799998, 2.999999998), FILLET2_R, 180.001909923, 90)
            Line((-0.0002, 2.999899995), (-0.0602, 2.999897995))
            ThreePointArc((-0.0602, 2.999897995), (-0.06005, 1.499947999), (-0.06, -2e-06))
            Line((-0.06, -2e-06), (2e-06, -0.06))
            ThreePointArc((2e-06, -0.06), (1.499951999, -0.05995), (2.999902002, -0.06))
            Line((2.999902002, -0.06), (2.999900002, 0))
        make_face()
    extrude(amount=9.499850004, mode=Mode.SUBTRACT)
    with BuildSketch(Plane(origin=(2.9999, 70, -2.9999), x_dir=(0, 0, 1), z_dir=(1, 0, 0))) as fillet2_piece_8:
        with BuildLine():
            CenterArc((0, 2.9999), FILLET2_R, 270, 90)
            Line((3, 2.9999), (3.06, 2.9999))
            ThreePointArc((3.06, 2.9999), (3.0599, 1.49995), (3.0599, 0))
            Line((3.0599, 0), (2.9999, -0.06))
            ThreePointArc((2.9999, -0.06), (1.49995, -0.06), (0, -0.0601))
            Line((0, -0.0601), (0, -0.0001))
        make_face()
    revolve(axis=Axis((2.9999, 70, -2.9999), (0, -1, 0)), revolution_arc=90, mode=Mode.SUBTRACT)

    # Sketch22 → Cut-Extrude12 (cut)
    with BuildSketch(Plane(origin=(120, 0, 0), x_dir=(0, 0, -1), z_dir=(1, 0, 0))):
        with Locations((21.75, 47.95)):
            Rectangle(SKETCH22_W, SKETCH22_H)
    extrude(amount=-CUT_EXTRUDE12_DEPTH, mode=Mode.SUBTRACT)


solid = part.part
